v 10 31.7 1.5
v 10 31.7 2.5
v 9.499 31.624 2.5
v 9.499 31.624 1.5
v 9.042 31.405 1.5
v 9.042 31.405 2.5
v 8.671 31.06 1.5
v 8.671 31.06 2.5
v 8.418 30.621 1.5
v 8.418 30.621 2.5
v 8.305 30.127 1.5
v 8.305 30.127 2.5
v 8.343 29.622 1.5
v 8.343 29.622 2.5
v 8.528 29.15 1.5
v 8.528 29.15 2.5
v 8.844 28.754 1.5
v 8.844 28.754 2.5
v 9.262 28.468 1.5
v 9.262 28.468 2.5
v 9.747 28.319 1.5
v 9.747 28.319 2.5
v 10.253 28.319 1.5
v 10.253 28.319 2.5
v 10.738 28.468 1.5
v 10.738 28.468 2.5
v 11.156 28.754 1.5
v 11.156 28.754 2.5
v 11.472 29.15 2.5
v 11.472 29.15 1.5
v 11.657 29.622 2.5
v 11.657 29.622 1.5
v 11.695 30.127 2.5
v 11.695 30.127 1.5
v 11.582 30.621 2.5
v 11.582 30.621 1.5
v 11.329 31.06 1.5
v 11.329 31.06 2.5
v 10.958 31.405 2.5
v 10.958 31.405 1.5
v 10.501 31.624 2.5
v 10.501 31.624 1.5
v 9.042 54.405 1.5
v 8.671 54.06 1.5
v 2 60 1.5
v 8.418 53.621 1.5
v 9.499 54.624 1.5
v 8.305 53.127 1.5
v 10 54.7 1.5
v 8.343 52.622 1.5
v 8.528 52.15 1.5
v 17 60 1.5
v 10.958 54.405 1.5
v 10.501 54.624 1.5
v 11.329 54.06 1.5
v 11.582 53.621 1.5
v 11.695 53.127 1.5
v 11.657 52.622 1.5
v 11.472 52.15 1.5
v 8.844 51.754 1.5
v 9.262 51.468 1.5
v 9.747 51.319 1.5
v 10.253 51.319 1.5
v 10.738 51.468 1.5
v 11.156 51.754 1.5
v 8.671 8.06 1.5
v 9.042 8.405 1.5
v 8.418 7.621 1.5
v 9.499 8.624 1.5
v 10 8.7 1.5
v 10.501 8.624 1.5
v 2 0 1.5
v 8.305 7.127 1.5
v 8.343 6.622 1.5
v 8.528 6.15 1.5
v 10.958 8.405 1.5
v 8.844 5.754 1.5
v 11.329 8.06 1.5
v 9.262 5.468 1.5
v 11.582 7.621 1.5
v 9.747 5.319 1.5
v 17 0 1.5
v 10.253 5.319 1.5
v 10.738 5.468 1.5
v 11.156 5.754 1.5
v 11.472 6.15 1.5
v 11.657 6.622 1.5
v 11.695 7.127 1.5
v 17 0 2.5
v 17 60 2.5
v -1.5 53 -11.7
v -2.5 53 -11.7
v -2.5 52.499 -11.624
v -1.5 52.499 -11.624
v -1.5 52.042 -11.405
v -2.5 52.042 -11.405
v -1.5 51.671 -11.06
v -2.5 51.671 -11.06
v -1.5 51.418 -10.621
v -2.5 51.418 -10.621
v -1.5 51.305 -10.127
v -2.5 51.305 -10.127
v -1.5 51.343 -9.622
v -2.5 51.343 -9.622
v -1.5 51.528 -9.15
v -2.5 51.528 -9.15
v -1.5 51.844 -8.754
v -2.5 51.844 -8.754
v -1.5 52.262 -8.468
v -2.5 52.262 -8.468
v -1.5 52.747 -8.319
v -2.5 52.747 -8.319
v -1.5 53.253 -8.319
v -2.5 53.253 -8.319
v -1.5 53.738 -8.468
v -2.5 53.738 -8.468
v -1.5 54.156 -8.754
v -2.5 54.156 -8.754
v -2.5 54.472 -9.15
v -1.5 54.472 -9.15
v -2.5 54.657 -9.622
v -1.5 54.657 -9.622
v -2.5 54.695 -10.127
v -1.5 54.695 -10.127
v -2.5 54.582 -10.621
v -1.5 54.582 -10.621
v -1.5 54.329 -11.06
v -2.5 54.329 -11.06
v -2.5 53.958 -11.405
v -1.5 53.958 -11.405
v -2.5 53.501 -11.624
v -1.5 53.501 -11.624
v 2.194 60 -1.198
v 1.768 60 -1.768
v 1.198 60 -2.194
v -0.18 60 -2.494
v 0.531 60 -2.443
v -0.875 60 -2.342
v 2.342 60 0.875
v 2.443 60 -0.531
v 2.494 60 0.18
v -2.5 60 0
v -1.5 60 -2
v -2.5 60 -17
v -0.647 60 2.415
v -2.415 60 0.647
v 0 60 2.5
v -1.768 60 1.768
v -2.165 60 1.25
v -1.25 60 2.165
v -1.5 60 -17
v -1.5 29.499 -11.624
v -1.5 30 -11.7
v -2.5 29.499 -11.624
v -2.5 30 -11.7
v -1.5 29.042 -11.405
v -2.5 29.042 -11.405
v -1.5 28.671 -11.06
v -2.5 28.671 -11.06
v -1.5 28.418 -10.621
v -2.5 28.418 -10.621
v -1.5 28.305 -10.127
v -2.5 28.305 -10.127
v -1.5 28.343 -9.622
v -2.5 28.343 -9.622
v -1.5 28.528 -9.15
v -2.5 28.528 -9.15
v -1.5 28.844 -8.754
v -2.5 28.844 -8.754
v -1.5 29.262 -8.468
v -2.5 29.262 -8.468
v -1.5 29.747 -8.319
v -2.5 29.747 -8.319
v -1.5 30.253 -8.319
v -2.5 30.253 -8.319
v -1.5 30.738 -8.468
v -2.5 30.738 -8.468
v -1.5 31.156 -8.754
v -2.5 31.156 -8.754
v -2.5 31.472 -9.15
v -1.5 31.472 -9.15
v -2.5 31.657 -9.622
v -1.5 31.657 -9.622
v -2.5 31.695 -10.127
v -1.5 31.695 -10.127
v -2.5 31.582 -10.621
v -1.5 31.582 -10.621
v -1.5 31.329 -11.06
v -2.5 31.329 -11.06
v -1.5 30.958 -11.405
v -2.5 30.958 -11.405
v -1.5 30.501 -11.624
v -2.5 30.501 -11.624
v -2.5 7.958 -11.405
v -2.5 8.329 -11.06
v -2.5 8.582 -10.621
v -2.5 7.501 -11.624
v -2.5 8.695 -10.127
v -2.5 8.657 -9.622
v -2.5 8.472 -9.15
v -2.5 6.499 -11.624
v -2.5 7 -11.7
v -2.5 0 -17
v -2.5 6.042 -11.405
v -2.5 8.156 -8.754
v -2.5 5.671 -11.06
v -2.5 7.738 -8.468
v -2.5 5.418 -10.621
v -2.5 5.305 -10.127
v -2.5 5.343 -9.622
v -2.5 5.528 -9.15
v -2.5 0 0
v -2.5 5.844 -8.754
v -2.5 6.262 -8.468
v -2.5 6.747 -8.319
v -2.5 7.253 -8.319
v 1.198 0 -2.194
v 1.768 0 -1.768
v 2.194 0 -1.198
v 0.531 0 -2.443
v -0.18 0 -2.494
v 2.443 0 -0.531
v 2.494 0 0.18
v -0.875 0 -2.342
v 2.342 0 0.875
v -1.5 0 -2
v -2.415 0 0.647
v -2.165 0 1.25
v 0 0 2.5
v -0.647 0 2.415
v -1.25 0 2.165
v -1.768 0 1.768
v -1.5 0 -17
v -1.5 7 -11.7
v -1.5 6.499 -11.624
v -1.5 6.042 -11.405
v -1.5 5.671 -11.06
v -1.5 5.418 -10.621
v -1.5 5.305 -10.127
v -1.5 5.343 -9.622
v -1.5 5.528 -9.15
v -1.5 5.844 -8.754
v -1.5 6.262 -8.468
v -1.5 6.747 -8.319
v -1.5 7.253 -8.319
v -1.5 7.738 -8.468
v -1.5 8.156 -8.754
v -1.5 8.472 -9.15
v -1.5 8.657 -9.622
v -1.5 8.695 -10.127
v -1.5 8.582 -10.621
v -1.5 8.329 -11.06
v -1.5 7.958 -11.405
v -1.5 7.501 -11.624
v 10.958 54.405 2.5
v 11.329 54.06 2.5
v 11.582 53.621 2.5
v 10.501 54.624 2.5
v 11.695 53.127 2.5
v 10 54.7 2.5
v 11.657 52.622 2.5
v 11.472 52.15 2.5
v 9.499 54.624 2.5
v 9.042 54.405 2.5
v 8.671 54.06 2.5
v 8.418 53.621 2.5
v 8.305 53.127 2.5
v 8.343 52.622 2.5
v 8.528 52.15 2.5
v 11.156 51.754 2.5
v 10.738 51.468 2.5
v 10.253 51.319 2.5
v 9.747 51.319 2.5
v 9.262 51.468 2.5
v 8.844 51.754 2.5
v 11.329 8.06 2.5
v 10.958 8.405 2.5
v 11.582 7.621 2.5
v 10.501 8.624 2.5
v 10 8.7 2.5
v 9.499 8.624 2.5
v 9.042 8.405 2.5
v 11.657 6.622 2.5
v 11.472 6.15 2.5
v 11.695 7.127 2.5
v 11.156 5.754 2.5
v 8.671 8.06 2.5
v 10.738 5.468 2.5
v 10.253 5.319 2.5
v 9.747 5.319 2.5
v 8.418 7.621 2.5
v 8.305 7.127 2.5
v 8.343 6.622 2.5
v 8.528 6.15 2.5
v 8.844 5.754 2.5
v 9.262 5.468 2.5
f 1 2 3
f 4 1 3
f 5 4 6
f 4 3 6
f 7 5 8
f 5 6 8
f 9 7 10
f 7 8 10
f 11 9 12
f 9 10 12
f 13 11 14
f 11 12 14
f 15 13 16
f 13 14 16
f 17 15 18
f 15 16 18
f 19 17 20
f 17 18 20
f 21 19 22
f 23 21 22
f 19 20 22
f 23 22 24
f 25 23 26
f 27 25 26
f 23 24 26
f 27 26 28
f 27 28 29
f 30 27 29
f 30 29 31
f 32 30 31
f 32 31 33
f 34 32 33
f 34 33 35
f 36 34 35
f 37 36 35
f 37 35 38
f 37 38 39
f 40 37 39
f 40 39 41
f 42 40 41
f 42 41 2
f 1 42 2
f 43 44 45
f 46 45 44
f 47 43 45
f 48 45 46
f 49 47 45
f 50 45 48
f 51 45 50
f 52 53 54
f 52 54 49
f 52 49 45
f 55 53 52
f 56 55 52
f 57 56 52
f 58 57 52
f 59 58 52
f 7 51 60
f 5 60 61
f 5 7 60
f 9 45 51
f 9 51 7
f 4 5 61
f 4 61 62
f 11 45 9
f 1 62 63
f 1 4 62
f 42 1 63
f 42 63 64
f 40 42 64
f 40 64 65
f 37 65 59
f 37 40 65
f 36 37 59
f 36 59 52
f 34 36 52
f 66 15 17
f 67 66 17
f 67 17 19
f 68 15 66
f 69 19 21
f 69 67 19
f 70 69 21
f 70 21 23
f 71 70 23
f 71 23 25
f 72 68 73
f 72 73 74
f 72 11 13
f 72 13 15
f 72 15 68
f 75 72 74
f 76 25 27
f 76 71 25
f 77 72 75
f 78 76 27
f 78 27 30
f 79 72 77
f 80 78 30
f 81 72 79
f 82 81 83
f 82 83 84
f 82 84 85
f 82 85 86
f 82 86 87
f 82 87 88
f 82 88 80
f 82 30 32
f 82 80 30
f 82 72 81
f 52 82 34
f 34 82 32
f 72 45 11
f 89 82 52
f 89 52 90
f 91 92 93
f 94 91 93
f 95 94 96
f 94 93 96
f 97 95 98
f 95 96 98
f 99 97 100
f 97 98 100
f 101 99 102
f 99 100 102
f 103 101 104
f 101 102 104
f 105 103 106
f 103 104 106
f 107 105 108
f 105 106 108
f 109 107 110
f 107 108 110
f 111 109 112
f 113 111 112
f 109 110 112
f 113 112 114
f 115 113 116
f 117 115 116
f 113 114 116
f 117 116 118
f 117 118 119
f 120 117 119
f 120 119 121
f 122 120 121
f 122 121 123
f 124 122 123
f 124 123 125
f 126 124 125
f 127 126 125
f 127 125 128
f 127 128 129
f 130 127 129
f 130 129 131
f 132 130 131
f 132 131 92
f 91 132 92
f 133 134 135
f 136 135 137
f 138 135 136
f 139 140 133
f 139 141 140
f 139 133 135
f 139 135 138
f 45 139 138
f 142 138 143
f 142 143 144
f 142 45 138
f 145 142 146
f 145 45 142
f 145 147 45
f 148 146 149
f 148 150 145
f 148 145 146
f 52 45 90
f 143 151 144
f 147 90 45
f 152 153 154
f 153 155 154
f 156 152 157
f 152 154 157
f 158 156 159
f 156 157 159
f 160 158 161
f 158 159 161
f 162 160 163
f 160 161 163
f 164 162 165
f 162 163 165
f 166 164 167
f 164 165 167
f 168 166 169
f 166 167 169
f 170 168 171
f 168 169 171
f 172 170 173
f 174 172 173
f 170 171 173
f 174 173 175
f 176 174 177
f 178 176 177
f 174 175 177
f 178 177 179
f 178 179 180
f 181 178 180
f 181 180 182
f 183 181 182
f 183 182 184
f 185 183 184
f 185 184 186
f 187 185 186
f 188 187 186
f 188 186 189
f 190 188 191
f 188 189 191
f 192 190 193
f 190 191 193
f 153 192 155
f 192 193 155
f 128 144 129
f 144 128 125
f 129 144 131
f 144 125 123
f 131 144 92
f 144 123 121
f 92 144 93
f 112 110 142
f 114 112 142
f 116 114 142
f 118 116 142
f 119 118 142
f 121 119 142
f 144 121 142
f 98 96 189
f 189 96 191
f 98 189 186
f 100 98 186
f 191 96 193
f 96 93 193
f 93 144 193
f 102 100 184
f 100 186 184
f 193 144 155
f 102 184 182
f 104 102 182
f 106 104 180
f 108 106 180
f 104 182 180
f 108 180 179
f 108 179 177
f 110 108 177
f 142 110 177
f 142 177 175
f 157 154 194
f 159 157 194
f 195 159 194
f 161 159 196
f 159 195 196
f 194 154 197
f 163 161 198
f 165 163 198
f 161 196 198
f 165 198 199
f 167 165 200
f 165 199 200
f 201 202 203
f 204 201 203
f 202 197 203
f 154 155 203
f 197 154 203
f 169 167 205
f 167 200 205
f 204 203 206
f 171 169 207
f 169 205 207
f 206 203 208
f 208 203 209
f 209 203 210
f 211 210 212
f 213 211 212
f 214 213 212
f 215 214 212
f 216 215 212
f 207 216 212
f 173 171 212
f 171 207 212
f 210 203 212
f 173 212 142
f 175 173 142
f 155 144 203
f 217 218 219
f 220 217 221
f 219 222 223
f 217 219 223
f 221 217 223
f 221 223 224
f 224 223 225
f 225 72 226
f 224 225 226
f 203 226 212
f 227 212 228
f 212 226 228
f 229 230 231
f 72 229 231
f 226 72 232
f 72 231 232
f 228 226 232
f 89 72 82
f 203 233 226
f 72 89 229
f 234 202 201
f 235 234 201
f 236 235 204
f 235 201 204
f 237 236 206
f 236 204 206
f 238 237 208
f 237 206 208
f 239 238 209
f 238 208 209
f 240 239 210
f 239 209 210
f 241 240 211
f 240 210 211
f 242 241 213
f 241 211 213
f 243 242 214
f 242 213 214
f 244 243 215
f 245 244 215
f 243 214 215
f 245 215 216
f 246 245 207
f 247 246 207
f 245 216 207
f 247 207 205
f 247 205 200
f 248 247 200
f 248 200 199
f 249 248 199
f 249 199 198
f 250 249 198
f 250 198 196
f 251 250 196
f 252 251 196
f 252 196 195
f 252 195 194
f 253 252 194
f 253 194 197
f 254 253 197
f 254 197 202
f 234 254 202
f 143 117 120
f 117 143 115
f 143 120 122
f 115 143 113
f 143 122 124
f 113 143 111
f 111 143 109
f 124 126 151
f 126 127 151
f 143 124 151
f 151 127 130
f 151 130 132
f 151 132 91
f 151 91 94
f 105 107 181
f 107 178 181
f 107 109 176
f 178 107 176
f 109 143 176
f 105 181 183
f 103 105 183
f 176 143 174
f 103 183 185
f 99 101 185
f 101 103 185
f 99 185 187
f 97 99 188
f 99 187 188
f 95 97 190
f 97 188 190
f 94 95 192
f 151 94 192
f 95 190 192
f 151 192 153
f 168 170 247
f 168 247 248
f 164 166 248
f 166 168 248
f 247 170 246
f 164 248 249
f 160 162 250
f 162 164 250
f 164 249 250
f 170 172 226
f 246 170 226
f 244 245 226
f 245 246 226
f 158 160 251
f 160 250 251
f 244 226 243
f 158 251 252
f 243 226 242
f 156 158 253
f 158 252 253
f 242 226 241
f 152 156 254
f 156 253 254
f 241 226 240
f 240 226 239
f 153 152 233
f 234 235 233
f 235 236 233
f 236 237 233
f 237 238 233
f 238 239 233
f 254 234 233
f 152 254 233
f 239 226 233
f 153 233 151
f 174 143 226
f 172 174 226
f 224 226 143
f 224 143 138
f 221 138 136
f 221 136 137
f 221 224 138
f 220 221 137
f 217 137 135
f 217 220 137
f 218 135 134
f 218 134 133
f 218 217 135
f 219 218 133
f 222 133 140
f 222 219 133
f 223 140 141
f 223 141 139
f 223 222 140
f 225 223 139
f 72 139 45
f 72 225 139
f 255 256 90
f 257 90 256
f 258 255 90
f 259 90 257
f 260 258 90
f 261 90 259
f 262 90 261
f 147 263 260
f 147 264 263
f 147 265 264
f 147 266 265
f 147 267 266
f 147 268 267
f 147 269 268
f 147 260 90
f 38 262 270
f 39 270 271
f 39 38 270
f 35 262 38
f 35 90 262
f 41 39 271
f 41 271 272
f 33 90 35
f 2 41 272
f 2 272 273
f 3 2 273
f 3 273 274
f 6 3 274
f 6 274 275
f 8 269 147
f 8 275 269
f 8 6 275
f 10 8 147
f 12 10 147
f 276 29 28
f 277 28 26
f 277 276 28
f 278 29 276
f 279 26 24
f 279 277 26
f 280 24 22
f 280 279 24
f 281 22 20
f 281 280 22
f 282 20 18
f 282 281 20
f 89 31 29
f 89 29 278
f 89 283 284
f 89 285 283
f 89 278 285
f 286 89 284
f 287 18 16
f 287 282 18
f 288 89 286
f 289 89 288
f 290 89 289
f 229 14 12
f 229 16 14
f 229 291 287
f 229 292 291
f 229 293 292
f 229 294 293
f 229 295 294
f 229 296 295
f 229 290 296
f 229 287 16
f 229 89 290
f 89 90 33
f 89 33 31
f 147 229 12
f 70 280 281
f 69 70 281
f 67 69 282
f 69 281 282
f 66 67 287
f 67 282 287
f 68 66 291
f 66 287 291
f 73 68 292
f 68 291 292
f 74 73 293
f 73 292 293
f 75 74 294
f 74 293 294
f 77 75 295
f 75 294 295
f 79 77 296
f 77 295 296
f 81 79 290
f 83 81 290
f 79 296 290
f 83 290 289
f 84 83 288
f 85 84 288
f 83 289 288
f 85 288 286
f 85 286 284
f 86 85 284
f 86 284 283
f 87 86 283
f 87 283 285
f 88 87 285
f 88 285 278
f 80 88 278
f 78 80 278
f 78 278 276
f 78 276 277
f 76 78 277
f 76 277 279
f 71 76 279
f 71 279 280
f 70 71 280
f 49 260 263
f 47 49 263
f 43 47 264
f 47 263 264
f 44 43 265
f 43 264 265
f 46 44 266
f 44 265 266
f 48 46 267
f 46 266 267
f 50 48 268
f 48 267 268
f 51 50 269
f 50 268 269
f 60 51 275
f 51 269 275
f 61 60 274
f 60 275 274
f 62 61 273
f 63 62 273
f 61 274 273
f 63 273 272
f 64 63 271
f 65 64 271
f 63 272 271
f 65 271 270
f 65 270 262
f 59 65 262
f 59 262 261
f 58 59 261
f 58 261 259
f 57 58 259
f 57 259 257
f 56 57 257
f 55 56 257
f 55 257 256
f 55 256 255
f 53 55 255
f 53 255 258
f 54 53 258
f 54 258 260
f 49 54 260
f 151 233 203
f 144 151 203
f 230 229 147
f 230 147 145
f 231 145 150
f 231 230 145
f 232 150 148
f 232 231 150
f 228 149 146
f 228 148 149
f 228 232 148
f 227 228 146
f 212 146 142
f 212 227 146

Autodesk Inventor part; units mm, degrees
ref_plane "YZ Plane" through (0, 0, 0) normal (1, 0, 0) x (0, 1, 0)
ref_plane "XZ Plane" through (0, 0, 0) normal (0, 1, 0) x (-1, 0, 0)
ref_plane "XY Plane" through (0, 0, 0) normal (0, 0, 1) x (1, 0, 0)
sketch "Sketch1" plane through (0, 0, 0) normal (0, 1, 0) x (-1, 0, 0)
  circle A0 centre (0, 0) radius 2.5
  line L0 (-22.4, 0) -> (15.4, 0) projected
  line L1 (2.5, 0) -> (1.5, 0)
  line L2 (1.5, 0) -> (1.5, -17)
  line L3 (1.5, -17) -> (2.5, -17)
  line L4 (2.5, -17) -> (2.5, 0)
  line L5 (0, 0) -> (-7.0711, -7.0711) construction
  line L6 (0, 0) -> (10, 0) construction
  line L7 (0, 1.5) -> (-17, 1.5)
  line L8 (-17, 1.5) -> (-17, 2.5)
  line L9 (-17, 2.5) -> (0, 2.5)
  line L10 (0, 1.5) -> (0, 2.5)
  dimension "d0" = 5
  dimension "d1" = 1
  dimension "d2" = 17
  dimension "d3" = 10
  dimension "d4" = 135
extrude "Extrusion1" add sketch "Sketch1" along normal blind 60
sketch "Sketch2" plane through (17, 0, 1.5) normal (0, 0, -1) x (-1, 0, 0)
  line L0 (0, 60) -> (15, 60) projected
  line L1 (7, 60) -> (7, 0) construction
  line L2 (15, 0) -> (0, 0) projected
  line L3 (0, 0) -> (0, 60) projected
  point P0 (17, 0)
  point P1 (7, 30)
  point P2 (7, 53)
  point P3 (7, 7)
  dimension "d7" = 7
  dimension "d8" = 30
  dimension "d9" = 7
  dimension "d10" = 7
hole "Hole1" at (10, 30, 1.5) at (10, 53, 1.5) at (10, 7, 1.5) direction (0, 0, 1) diameter 3.4 end through all clearance for "Countersunk Flat Head Screw DIN EN ISO 2009" size "M3" standard "DIN"
sketch "Sketch3" plane through (-1.5, 0, -2) normal (1, 0, 0) x (0, 0, -1)
  line L0 (0, 60) -> (15, 60) projected
  line L1 (8, 60) -> (8, 0) construction
  line L2 (15, 0) -> (15, 60) projected
  line L3 (15, 0) -> (0, 0) projected
  point P0 (-2, 0)
  point P1 (8, 30)
  point P2 (8, 7)
  point P3 (8, 53)
  dimension "d18" = 7
  dimension "d19" = 30
  dimension "d20" = 7
  dimension "d21" = 7
hole "Hole2" at (-1.5, 30, -10) at (-1.5, 7, -10) at (-1.5, 53, -10) direction (-1, 0, 0) diameter 3.4 end through all clearance for "Countersunk Flat Head Screw DIN EN ISO 2009" size "M3" standard "DIN"
properties part number "scharnier"
